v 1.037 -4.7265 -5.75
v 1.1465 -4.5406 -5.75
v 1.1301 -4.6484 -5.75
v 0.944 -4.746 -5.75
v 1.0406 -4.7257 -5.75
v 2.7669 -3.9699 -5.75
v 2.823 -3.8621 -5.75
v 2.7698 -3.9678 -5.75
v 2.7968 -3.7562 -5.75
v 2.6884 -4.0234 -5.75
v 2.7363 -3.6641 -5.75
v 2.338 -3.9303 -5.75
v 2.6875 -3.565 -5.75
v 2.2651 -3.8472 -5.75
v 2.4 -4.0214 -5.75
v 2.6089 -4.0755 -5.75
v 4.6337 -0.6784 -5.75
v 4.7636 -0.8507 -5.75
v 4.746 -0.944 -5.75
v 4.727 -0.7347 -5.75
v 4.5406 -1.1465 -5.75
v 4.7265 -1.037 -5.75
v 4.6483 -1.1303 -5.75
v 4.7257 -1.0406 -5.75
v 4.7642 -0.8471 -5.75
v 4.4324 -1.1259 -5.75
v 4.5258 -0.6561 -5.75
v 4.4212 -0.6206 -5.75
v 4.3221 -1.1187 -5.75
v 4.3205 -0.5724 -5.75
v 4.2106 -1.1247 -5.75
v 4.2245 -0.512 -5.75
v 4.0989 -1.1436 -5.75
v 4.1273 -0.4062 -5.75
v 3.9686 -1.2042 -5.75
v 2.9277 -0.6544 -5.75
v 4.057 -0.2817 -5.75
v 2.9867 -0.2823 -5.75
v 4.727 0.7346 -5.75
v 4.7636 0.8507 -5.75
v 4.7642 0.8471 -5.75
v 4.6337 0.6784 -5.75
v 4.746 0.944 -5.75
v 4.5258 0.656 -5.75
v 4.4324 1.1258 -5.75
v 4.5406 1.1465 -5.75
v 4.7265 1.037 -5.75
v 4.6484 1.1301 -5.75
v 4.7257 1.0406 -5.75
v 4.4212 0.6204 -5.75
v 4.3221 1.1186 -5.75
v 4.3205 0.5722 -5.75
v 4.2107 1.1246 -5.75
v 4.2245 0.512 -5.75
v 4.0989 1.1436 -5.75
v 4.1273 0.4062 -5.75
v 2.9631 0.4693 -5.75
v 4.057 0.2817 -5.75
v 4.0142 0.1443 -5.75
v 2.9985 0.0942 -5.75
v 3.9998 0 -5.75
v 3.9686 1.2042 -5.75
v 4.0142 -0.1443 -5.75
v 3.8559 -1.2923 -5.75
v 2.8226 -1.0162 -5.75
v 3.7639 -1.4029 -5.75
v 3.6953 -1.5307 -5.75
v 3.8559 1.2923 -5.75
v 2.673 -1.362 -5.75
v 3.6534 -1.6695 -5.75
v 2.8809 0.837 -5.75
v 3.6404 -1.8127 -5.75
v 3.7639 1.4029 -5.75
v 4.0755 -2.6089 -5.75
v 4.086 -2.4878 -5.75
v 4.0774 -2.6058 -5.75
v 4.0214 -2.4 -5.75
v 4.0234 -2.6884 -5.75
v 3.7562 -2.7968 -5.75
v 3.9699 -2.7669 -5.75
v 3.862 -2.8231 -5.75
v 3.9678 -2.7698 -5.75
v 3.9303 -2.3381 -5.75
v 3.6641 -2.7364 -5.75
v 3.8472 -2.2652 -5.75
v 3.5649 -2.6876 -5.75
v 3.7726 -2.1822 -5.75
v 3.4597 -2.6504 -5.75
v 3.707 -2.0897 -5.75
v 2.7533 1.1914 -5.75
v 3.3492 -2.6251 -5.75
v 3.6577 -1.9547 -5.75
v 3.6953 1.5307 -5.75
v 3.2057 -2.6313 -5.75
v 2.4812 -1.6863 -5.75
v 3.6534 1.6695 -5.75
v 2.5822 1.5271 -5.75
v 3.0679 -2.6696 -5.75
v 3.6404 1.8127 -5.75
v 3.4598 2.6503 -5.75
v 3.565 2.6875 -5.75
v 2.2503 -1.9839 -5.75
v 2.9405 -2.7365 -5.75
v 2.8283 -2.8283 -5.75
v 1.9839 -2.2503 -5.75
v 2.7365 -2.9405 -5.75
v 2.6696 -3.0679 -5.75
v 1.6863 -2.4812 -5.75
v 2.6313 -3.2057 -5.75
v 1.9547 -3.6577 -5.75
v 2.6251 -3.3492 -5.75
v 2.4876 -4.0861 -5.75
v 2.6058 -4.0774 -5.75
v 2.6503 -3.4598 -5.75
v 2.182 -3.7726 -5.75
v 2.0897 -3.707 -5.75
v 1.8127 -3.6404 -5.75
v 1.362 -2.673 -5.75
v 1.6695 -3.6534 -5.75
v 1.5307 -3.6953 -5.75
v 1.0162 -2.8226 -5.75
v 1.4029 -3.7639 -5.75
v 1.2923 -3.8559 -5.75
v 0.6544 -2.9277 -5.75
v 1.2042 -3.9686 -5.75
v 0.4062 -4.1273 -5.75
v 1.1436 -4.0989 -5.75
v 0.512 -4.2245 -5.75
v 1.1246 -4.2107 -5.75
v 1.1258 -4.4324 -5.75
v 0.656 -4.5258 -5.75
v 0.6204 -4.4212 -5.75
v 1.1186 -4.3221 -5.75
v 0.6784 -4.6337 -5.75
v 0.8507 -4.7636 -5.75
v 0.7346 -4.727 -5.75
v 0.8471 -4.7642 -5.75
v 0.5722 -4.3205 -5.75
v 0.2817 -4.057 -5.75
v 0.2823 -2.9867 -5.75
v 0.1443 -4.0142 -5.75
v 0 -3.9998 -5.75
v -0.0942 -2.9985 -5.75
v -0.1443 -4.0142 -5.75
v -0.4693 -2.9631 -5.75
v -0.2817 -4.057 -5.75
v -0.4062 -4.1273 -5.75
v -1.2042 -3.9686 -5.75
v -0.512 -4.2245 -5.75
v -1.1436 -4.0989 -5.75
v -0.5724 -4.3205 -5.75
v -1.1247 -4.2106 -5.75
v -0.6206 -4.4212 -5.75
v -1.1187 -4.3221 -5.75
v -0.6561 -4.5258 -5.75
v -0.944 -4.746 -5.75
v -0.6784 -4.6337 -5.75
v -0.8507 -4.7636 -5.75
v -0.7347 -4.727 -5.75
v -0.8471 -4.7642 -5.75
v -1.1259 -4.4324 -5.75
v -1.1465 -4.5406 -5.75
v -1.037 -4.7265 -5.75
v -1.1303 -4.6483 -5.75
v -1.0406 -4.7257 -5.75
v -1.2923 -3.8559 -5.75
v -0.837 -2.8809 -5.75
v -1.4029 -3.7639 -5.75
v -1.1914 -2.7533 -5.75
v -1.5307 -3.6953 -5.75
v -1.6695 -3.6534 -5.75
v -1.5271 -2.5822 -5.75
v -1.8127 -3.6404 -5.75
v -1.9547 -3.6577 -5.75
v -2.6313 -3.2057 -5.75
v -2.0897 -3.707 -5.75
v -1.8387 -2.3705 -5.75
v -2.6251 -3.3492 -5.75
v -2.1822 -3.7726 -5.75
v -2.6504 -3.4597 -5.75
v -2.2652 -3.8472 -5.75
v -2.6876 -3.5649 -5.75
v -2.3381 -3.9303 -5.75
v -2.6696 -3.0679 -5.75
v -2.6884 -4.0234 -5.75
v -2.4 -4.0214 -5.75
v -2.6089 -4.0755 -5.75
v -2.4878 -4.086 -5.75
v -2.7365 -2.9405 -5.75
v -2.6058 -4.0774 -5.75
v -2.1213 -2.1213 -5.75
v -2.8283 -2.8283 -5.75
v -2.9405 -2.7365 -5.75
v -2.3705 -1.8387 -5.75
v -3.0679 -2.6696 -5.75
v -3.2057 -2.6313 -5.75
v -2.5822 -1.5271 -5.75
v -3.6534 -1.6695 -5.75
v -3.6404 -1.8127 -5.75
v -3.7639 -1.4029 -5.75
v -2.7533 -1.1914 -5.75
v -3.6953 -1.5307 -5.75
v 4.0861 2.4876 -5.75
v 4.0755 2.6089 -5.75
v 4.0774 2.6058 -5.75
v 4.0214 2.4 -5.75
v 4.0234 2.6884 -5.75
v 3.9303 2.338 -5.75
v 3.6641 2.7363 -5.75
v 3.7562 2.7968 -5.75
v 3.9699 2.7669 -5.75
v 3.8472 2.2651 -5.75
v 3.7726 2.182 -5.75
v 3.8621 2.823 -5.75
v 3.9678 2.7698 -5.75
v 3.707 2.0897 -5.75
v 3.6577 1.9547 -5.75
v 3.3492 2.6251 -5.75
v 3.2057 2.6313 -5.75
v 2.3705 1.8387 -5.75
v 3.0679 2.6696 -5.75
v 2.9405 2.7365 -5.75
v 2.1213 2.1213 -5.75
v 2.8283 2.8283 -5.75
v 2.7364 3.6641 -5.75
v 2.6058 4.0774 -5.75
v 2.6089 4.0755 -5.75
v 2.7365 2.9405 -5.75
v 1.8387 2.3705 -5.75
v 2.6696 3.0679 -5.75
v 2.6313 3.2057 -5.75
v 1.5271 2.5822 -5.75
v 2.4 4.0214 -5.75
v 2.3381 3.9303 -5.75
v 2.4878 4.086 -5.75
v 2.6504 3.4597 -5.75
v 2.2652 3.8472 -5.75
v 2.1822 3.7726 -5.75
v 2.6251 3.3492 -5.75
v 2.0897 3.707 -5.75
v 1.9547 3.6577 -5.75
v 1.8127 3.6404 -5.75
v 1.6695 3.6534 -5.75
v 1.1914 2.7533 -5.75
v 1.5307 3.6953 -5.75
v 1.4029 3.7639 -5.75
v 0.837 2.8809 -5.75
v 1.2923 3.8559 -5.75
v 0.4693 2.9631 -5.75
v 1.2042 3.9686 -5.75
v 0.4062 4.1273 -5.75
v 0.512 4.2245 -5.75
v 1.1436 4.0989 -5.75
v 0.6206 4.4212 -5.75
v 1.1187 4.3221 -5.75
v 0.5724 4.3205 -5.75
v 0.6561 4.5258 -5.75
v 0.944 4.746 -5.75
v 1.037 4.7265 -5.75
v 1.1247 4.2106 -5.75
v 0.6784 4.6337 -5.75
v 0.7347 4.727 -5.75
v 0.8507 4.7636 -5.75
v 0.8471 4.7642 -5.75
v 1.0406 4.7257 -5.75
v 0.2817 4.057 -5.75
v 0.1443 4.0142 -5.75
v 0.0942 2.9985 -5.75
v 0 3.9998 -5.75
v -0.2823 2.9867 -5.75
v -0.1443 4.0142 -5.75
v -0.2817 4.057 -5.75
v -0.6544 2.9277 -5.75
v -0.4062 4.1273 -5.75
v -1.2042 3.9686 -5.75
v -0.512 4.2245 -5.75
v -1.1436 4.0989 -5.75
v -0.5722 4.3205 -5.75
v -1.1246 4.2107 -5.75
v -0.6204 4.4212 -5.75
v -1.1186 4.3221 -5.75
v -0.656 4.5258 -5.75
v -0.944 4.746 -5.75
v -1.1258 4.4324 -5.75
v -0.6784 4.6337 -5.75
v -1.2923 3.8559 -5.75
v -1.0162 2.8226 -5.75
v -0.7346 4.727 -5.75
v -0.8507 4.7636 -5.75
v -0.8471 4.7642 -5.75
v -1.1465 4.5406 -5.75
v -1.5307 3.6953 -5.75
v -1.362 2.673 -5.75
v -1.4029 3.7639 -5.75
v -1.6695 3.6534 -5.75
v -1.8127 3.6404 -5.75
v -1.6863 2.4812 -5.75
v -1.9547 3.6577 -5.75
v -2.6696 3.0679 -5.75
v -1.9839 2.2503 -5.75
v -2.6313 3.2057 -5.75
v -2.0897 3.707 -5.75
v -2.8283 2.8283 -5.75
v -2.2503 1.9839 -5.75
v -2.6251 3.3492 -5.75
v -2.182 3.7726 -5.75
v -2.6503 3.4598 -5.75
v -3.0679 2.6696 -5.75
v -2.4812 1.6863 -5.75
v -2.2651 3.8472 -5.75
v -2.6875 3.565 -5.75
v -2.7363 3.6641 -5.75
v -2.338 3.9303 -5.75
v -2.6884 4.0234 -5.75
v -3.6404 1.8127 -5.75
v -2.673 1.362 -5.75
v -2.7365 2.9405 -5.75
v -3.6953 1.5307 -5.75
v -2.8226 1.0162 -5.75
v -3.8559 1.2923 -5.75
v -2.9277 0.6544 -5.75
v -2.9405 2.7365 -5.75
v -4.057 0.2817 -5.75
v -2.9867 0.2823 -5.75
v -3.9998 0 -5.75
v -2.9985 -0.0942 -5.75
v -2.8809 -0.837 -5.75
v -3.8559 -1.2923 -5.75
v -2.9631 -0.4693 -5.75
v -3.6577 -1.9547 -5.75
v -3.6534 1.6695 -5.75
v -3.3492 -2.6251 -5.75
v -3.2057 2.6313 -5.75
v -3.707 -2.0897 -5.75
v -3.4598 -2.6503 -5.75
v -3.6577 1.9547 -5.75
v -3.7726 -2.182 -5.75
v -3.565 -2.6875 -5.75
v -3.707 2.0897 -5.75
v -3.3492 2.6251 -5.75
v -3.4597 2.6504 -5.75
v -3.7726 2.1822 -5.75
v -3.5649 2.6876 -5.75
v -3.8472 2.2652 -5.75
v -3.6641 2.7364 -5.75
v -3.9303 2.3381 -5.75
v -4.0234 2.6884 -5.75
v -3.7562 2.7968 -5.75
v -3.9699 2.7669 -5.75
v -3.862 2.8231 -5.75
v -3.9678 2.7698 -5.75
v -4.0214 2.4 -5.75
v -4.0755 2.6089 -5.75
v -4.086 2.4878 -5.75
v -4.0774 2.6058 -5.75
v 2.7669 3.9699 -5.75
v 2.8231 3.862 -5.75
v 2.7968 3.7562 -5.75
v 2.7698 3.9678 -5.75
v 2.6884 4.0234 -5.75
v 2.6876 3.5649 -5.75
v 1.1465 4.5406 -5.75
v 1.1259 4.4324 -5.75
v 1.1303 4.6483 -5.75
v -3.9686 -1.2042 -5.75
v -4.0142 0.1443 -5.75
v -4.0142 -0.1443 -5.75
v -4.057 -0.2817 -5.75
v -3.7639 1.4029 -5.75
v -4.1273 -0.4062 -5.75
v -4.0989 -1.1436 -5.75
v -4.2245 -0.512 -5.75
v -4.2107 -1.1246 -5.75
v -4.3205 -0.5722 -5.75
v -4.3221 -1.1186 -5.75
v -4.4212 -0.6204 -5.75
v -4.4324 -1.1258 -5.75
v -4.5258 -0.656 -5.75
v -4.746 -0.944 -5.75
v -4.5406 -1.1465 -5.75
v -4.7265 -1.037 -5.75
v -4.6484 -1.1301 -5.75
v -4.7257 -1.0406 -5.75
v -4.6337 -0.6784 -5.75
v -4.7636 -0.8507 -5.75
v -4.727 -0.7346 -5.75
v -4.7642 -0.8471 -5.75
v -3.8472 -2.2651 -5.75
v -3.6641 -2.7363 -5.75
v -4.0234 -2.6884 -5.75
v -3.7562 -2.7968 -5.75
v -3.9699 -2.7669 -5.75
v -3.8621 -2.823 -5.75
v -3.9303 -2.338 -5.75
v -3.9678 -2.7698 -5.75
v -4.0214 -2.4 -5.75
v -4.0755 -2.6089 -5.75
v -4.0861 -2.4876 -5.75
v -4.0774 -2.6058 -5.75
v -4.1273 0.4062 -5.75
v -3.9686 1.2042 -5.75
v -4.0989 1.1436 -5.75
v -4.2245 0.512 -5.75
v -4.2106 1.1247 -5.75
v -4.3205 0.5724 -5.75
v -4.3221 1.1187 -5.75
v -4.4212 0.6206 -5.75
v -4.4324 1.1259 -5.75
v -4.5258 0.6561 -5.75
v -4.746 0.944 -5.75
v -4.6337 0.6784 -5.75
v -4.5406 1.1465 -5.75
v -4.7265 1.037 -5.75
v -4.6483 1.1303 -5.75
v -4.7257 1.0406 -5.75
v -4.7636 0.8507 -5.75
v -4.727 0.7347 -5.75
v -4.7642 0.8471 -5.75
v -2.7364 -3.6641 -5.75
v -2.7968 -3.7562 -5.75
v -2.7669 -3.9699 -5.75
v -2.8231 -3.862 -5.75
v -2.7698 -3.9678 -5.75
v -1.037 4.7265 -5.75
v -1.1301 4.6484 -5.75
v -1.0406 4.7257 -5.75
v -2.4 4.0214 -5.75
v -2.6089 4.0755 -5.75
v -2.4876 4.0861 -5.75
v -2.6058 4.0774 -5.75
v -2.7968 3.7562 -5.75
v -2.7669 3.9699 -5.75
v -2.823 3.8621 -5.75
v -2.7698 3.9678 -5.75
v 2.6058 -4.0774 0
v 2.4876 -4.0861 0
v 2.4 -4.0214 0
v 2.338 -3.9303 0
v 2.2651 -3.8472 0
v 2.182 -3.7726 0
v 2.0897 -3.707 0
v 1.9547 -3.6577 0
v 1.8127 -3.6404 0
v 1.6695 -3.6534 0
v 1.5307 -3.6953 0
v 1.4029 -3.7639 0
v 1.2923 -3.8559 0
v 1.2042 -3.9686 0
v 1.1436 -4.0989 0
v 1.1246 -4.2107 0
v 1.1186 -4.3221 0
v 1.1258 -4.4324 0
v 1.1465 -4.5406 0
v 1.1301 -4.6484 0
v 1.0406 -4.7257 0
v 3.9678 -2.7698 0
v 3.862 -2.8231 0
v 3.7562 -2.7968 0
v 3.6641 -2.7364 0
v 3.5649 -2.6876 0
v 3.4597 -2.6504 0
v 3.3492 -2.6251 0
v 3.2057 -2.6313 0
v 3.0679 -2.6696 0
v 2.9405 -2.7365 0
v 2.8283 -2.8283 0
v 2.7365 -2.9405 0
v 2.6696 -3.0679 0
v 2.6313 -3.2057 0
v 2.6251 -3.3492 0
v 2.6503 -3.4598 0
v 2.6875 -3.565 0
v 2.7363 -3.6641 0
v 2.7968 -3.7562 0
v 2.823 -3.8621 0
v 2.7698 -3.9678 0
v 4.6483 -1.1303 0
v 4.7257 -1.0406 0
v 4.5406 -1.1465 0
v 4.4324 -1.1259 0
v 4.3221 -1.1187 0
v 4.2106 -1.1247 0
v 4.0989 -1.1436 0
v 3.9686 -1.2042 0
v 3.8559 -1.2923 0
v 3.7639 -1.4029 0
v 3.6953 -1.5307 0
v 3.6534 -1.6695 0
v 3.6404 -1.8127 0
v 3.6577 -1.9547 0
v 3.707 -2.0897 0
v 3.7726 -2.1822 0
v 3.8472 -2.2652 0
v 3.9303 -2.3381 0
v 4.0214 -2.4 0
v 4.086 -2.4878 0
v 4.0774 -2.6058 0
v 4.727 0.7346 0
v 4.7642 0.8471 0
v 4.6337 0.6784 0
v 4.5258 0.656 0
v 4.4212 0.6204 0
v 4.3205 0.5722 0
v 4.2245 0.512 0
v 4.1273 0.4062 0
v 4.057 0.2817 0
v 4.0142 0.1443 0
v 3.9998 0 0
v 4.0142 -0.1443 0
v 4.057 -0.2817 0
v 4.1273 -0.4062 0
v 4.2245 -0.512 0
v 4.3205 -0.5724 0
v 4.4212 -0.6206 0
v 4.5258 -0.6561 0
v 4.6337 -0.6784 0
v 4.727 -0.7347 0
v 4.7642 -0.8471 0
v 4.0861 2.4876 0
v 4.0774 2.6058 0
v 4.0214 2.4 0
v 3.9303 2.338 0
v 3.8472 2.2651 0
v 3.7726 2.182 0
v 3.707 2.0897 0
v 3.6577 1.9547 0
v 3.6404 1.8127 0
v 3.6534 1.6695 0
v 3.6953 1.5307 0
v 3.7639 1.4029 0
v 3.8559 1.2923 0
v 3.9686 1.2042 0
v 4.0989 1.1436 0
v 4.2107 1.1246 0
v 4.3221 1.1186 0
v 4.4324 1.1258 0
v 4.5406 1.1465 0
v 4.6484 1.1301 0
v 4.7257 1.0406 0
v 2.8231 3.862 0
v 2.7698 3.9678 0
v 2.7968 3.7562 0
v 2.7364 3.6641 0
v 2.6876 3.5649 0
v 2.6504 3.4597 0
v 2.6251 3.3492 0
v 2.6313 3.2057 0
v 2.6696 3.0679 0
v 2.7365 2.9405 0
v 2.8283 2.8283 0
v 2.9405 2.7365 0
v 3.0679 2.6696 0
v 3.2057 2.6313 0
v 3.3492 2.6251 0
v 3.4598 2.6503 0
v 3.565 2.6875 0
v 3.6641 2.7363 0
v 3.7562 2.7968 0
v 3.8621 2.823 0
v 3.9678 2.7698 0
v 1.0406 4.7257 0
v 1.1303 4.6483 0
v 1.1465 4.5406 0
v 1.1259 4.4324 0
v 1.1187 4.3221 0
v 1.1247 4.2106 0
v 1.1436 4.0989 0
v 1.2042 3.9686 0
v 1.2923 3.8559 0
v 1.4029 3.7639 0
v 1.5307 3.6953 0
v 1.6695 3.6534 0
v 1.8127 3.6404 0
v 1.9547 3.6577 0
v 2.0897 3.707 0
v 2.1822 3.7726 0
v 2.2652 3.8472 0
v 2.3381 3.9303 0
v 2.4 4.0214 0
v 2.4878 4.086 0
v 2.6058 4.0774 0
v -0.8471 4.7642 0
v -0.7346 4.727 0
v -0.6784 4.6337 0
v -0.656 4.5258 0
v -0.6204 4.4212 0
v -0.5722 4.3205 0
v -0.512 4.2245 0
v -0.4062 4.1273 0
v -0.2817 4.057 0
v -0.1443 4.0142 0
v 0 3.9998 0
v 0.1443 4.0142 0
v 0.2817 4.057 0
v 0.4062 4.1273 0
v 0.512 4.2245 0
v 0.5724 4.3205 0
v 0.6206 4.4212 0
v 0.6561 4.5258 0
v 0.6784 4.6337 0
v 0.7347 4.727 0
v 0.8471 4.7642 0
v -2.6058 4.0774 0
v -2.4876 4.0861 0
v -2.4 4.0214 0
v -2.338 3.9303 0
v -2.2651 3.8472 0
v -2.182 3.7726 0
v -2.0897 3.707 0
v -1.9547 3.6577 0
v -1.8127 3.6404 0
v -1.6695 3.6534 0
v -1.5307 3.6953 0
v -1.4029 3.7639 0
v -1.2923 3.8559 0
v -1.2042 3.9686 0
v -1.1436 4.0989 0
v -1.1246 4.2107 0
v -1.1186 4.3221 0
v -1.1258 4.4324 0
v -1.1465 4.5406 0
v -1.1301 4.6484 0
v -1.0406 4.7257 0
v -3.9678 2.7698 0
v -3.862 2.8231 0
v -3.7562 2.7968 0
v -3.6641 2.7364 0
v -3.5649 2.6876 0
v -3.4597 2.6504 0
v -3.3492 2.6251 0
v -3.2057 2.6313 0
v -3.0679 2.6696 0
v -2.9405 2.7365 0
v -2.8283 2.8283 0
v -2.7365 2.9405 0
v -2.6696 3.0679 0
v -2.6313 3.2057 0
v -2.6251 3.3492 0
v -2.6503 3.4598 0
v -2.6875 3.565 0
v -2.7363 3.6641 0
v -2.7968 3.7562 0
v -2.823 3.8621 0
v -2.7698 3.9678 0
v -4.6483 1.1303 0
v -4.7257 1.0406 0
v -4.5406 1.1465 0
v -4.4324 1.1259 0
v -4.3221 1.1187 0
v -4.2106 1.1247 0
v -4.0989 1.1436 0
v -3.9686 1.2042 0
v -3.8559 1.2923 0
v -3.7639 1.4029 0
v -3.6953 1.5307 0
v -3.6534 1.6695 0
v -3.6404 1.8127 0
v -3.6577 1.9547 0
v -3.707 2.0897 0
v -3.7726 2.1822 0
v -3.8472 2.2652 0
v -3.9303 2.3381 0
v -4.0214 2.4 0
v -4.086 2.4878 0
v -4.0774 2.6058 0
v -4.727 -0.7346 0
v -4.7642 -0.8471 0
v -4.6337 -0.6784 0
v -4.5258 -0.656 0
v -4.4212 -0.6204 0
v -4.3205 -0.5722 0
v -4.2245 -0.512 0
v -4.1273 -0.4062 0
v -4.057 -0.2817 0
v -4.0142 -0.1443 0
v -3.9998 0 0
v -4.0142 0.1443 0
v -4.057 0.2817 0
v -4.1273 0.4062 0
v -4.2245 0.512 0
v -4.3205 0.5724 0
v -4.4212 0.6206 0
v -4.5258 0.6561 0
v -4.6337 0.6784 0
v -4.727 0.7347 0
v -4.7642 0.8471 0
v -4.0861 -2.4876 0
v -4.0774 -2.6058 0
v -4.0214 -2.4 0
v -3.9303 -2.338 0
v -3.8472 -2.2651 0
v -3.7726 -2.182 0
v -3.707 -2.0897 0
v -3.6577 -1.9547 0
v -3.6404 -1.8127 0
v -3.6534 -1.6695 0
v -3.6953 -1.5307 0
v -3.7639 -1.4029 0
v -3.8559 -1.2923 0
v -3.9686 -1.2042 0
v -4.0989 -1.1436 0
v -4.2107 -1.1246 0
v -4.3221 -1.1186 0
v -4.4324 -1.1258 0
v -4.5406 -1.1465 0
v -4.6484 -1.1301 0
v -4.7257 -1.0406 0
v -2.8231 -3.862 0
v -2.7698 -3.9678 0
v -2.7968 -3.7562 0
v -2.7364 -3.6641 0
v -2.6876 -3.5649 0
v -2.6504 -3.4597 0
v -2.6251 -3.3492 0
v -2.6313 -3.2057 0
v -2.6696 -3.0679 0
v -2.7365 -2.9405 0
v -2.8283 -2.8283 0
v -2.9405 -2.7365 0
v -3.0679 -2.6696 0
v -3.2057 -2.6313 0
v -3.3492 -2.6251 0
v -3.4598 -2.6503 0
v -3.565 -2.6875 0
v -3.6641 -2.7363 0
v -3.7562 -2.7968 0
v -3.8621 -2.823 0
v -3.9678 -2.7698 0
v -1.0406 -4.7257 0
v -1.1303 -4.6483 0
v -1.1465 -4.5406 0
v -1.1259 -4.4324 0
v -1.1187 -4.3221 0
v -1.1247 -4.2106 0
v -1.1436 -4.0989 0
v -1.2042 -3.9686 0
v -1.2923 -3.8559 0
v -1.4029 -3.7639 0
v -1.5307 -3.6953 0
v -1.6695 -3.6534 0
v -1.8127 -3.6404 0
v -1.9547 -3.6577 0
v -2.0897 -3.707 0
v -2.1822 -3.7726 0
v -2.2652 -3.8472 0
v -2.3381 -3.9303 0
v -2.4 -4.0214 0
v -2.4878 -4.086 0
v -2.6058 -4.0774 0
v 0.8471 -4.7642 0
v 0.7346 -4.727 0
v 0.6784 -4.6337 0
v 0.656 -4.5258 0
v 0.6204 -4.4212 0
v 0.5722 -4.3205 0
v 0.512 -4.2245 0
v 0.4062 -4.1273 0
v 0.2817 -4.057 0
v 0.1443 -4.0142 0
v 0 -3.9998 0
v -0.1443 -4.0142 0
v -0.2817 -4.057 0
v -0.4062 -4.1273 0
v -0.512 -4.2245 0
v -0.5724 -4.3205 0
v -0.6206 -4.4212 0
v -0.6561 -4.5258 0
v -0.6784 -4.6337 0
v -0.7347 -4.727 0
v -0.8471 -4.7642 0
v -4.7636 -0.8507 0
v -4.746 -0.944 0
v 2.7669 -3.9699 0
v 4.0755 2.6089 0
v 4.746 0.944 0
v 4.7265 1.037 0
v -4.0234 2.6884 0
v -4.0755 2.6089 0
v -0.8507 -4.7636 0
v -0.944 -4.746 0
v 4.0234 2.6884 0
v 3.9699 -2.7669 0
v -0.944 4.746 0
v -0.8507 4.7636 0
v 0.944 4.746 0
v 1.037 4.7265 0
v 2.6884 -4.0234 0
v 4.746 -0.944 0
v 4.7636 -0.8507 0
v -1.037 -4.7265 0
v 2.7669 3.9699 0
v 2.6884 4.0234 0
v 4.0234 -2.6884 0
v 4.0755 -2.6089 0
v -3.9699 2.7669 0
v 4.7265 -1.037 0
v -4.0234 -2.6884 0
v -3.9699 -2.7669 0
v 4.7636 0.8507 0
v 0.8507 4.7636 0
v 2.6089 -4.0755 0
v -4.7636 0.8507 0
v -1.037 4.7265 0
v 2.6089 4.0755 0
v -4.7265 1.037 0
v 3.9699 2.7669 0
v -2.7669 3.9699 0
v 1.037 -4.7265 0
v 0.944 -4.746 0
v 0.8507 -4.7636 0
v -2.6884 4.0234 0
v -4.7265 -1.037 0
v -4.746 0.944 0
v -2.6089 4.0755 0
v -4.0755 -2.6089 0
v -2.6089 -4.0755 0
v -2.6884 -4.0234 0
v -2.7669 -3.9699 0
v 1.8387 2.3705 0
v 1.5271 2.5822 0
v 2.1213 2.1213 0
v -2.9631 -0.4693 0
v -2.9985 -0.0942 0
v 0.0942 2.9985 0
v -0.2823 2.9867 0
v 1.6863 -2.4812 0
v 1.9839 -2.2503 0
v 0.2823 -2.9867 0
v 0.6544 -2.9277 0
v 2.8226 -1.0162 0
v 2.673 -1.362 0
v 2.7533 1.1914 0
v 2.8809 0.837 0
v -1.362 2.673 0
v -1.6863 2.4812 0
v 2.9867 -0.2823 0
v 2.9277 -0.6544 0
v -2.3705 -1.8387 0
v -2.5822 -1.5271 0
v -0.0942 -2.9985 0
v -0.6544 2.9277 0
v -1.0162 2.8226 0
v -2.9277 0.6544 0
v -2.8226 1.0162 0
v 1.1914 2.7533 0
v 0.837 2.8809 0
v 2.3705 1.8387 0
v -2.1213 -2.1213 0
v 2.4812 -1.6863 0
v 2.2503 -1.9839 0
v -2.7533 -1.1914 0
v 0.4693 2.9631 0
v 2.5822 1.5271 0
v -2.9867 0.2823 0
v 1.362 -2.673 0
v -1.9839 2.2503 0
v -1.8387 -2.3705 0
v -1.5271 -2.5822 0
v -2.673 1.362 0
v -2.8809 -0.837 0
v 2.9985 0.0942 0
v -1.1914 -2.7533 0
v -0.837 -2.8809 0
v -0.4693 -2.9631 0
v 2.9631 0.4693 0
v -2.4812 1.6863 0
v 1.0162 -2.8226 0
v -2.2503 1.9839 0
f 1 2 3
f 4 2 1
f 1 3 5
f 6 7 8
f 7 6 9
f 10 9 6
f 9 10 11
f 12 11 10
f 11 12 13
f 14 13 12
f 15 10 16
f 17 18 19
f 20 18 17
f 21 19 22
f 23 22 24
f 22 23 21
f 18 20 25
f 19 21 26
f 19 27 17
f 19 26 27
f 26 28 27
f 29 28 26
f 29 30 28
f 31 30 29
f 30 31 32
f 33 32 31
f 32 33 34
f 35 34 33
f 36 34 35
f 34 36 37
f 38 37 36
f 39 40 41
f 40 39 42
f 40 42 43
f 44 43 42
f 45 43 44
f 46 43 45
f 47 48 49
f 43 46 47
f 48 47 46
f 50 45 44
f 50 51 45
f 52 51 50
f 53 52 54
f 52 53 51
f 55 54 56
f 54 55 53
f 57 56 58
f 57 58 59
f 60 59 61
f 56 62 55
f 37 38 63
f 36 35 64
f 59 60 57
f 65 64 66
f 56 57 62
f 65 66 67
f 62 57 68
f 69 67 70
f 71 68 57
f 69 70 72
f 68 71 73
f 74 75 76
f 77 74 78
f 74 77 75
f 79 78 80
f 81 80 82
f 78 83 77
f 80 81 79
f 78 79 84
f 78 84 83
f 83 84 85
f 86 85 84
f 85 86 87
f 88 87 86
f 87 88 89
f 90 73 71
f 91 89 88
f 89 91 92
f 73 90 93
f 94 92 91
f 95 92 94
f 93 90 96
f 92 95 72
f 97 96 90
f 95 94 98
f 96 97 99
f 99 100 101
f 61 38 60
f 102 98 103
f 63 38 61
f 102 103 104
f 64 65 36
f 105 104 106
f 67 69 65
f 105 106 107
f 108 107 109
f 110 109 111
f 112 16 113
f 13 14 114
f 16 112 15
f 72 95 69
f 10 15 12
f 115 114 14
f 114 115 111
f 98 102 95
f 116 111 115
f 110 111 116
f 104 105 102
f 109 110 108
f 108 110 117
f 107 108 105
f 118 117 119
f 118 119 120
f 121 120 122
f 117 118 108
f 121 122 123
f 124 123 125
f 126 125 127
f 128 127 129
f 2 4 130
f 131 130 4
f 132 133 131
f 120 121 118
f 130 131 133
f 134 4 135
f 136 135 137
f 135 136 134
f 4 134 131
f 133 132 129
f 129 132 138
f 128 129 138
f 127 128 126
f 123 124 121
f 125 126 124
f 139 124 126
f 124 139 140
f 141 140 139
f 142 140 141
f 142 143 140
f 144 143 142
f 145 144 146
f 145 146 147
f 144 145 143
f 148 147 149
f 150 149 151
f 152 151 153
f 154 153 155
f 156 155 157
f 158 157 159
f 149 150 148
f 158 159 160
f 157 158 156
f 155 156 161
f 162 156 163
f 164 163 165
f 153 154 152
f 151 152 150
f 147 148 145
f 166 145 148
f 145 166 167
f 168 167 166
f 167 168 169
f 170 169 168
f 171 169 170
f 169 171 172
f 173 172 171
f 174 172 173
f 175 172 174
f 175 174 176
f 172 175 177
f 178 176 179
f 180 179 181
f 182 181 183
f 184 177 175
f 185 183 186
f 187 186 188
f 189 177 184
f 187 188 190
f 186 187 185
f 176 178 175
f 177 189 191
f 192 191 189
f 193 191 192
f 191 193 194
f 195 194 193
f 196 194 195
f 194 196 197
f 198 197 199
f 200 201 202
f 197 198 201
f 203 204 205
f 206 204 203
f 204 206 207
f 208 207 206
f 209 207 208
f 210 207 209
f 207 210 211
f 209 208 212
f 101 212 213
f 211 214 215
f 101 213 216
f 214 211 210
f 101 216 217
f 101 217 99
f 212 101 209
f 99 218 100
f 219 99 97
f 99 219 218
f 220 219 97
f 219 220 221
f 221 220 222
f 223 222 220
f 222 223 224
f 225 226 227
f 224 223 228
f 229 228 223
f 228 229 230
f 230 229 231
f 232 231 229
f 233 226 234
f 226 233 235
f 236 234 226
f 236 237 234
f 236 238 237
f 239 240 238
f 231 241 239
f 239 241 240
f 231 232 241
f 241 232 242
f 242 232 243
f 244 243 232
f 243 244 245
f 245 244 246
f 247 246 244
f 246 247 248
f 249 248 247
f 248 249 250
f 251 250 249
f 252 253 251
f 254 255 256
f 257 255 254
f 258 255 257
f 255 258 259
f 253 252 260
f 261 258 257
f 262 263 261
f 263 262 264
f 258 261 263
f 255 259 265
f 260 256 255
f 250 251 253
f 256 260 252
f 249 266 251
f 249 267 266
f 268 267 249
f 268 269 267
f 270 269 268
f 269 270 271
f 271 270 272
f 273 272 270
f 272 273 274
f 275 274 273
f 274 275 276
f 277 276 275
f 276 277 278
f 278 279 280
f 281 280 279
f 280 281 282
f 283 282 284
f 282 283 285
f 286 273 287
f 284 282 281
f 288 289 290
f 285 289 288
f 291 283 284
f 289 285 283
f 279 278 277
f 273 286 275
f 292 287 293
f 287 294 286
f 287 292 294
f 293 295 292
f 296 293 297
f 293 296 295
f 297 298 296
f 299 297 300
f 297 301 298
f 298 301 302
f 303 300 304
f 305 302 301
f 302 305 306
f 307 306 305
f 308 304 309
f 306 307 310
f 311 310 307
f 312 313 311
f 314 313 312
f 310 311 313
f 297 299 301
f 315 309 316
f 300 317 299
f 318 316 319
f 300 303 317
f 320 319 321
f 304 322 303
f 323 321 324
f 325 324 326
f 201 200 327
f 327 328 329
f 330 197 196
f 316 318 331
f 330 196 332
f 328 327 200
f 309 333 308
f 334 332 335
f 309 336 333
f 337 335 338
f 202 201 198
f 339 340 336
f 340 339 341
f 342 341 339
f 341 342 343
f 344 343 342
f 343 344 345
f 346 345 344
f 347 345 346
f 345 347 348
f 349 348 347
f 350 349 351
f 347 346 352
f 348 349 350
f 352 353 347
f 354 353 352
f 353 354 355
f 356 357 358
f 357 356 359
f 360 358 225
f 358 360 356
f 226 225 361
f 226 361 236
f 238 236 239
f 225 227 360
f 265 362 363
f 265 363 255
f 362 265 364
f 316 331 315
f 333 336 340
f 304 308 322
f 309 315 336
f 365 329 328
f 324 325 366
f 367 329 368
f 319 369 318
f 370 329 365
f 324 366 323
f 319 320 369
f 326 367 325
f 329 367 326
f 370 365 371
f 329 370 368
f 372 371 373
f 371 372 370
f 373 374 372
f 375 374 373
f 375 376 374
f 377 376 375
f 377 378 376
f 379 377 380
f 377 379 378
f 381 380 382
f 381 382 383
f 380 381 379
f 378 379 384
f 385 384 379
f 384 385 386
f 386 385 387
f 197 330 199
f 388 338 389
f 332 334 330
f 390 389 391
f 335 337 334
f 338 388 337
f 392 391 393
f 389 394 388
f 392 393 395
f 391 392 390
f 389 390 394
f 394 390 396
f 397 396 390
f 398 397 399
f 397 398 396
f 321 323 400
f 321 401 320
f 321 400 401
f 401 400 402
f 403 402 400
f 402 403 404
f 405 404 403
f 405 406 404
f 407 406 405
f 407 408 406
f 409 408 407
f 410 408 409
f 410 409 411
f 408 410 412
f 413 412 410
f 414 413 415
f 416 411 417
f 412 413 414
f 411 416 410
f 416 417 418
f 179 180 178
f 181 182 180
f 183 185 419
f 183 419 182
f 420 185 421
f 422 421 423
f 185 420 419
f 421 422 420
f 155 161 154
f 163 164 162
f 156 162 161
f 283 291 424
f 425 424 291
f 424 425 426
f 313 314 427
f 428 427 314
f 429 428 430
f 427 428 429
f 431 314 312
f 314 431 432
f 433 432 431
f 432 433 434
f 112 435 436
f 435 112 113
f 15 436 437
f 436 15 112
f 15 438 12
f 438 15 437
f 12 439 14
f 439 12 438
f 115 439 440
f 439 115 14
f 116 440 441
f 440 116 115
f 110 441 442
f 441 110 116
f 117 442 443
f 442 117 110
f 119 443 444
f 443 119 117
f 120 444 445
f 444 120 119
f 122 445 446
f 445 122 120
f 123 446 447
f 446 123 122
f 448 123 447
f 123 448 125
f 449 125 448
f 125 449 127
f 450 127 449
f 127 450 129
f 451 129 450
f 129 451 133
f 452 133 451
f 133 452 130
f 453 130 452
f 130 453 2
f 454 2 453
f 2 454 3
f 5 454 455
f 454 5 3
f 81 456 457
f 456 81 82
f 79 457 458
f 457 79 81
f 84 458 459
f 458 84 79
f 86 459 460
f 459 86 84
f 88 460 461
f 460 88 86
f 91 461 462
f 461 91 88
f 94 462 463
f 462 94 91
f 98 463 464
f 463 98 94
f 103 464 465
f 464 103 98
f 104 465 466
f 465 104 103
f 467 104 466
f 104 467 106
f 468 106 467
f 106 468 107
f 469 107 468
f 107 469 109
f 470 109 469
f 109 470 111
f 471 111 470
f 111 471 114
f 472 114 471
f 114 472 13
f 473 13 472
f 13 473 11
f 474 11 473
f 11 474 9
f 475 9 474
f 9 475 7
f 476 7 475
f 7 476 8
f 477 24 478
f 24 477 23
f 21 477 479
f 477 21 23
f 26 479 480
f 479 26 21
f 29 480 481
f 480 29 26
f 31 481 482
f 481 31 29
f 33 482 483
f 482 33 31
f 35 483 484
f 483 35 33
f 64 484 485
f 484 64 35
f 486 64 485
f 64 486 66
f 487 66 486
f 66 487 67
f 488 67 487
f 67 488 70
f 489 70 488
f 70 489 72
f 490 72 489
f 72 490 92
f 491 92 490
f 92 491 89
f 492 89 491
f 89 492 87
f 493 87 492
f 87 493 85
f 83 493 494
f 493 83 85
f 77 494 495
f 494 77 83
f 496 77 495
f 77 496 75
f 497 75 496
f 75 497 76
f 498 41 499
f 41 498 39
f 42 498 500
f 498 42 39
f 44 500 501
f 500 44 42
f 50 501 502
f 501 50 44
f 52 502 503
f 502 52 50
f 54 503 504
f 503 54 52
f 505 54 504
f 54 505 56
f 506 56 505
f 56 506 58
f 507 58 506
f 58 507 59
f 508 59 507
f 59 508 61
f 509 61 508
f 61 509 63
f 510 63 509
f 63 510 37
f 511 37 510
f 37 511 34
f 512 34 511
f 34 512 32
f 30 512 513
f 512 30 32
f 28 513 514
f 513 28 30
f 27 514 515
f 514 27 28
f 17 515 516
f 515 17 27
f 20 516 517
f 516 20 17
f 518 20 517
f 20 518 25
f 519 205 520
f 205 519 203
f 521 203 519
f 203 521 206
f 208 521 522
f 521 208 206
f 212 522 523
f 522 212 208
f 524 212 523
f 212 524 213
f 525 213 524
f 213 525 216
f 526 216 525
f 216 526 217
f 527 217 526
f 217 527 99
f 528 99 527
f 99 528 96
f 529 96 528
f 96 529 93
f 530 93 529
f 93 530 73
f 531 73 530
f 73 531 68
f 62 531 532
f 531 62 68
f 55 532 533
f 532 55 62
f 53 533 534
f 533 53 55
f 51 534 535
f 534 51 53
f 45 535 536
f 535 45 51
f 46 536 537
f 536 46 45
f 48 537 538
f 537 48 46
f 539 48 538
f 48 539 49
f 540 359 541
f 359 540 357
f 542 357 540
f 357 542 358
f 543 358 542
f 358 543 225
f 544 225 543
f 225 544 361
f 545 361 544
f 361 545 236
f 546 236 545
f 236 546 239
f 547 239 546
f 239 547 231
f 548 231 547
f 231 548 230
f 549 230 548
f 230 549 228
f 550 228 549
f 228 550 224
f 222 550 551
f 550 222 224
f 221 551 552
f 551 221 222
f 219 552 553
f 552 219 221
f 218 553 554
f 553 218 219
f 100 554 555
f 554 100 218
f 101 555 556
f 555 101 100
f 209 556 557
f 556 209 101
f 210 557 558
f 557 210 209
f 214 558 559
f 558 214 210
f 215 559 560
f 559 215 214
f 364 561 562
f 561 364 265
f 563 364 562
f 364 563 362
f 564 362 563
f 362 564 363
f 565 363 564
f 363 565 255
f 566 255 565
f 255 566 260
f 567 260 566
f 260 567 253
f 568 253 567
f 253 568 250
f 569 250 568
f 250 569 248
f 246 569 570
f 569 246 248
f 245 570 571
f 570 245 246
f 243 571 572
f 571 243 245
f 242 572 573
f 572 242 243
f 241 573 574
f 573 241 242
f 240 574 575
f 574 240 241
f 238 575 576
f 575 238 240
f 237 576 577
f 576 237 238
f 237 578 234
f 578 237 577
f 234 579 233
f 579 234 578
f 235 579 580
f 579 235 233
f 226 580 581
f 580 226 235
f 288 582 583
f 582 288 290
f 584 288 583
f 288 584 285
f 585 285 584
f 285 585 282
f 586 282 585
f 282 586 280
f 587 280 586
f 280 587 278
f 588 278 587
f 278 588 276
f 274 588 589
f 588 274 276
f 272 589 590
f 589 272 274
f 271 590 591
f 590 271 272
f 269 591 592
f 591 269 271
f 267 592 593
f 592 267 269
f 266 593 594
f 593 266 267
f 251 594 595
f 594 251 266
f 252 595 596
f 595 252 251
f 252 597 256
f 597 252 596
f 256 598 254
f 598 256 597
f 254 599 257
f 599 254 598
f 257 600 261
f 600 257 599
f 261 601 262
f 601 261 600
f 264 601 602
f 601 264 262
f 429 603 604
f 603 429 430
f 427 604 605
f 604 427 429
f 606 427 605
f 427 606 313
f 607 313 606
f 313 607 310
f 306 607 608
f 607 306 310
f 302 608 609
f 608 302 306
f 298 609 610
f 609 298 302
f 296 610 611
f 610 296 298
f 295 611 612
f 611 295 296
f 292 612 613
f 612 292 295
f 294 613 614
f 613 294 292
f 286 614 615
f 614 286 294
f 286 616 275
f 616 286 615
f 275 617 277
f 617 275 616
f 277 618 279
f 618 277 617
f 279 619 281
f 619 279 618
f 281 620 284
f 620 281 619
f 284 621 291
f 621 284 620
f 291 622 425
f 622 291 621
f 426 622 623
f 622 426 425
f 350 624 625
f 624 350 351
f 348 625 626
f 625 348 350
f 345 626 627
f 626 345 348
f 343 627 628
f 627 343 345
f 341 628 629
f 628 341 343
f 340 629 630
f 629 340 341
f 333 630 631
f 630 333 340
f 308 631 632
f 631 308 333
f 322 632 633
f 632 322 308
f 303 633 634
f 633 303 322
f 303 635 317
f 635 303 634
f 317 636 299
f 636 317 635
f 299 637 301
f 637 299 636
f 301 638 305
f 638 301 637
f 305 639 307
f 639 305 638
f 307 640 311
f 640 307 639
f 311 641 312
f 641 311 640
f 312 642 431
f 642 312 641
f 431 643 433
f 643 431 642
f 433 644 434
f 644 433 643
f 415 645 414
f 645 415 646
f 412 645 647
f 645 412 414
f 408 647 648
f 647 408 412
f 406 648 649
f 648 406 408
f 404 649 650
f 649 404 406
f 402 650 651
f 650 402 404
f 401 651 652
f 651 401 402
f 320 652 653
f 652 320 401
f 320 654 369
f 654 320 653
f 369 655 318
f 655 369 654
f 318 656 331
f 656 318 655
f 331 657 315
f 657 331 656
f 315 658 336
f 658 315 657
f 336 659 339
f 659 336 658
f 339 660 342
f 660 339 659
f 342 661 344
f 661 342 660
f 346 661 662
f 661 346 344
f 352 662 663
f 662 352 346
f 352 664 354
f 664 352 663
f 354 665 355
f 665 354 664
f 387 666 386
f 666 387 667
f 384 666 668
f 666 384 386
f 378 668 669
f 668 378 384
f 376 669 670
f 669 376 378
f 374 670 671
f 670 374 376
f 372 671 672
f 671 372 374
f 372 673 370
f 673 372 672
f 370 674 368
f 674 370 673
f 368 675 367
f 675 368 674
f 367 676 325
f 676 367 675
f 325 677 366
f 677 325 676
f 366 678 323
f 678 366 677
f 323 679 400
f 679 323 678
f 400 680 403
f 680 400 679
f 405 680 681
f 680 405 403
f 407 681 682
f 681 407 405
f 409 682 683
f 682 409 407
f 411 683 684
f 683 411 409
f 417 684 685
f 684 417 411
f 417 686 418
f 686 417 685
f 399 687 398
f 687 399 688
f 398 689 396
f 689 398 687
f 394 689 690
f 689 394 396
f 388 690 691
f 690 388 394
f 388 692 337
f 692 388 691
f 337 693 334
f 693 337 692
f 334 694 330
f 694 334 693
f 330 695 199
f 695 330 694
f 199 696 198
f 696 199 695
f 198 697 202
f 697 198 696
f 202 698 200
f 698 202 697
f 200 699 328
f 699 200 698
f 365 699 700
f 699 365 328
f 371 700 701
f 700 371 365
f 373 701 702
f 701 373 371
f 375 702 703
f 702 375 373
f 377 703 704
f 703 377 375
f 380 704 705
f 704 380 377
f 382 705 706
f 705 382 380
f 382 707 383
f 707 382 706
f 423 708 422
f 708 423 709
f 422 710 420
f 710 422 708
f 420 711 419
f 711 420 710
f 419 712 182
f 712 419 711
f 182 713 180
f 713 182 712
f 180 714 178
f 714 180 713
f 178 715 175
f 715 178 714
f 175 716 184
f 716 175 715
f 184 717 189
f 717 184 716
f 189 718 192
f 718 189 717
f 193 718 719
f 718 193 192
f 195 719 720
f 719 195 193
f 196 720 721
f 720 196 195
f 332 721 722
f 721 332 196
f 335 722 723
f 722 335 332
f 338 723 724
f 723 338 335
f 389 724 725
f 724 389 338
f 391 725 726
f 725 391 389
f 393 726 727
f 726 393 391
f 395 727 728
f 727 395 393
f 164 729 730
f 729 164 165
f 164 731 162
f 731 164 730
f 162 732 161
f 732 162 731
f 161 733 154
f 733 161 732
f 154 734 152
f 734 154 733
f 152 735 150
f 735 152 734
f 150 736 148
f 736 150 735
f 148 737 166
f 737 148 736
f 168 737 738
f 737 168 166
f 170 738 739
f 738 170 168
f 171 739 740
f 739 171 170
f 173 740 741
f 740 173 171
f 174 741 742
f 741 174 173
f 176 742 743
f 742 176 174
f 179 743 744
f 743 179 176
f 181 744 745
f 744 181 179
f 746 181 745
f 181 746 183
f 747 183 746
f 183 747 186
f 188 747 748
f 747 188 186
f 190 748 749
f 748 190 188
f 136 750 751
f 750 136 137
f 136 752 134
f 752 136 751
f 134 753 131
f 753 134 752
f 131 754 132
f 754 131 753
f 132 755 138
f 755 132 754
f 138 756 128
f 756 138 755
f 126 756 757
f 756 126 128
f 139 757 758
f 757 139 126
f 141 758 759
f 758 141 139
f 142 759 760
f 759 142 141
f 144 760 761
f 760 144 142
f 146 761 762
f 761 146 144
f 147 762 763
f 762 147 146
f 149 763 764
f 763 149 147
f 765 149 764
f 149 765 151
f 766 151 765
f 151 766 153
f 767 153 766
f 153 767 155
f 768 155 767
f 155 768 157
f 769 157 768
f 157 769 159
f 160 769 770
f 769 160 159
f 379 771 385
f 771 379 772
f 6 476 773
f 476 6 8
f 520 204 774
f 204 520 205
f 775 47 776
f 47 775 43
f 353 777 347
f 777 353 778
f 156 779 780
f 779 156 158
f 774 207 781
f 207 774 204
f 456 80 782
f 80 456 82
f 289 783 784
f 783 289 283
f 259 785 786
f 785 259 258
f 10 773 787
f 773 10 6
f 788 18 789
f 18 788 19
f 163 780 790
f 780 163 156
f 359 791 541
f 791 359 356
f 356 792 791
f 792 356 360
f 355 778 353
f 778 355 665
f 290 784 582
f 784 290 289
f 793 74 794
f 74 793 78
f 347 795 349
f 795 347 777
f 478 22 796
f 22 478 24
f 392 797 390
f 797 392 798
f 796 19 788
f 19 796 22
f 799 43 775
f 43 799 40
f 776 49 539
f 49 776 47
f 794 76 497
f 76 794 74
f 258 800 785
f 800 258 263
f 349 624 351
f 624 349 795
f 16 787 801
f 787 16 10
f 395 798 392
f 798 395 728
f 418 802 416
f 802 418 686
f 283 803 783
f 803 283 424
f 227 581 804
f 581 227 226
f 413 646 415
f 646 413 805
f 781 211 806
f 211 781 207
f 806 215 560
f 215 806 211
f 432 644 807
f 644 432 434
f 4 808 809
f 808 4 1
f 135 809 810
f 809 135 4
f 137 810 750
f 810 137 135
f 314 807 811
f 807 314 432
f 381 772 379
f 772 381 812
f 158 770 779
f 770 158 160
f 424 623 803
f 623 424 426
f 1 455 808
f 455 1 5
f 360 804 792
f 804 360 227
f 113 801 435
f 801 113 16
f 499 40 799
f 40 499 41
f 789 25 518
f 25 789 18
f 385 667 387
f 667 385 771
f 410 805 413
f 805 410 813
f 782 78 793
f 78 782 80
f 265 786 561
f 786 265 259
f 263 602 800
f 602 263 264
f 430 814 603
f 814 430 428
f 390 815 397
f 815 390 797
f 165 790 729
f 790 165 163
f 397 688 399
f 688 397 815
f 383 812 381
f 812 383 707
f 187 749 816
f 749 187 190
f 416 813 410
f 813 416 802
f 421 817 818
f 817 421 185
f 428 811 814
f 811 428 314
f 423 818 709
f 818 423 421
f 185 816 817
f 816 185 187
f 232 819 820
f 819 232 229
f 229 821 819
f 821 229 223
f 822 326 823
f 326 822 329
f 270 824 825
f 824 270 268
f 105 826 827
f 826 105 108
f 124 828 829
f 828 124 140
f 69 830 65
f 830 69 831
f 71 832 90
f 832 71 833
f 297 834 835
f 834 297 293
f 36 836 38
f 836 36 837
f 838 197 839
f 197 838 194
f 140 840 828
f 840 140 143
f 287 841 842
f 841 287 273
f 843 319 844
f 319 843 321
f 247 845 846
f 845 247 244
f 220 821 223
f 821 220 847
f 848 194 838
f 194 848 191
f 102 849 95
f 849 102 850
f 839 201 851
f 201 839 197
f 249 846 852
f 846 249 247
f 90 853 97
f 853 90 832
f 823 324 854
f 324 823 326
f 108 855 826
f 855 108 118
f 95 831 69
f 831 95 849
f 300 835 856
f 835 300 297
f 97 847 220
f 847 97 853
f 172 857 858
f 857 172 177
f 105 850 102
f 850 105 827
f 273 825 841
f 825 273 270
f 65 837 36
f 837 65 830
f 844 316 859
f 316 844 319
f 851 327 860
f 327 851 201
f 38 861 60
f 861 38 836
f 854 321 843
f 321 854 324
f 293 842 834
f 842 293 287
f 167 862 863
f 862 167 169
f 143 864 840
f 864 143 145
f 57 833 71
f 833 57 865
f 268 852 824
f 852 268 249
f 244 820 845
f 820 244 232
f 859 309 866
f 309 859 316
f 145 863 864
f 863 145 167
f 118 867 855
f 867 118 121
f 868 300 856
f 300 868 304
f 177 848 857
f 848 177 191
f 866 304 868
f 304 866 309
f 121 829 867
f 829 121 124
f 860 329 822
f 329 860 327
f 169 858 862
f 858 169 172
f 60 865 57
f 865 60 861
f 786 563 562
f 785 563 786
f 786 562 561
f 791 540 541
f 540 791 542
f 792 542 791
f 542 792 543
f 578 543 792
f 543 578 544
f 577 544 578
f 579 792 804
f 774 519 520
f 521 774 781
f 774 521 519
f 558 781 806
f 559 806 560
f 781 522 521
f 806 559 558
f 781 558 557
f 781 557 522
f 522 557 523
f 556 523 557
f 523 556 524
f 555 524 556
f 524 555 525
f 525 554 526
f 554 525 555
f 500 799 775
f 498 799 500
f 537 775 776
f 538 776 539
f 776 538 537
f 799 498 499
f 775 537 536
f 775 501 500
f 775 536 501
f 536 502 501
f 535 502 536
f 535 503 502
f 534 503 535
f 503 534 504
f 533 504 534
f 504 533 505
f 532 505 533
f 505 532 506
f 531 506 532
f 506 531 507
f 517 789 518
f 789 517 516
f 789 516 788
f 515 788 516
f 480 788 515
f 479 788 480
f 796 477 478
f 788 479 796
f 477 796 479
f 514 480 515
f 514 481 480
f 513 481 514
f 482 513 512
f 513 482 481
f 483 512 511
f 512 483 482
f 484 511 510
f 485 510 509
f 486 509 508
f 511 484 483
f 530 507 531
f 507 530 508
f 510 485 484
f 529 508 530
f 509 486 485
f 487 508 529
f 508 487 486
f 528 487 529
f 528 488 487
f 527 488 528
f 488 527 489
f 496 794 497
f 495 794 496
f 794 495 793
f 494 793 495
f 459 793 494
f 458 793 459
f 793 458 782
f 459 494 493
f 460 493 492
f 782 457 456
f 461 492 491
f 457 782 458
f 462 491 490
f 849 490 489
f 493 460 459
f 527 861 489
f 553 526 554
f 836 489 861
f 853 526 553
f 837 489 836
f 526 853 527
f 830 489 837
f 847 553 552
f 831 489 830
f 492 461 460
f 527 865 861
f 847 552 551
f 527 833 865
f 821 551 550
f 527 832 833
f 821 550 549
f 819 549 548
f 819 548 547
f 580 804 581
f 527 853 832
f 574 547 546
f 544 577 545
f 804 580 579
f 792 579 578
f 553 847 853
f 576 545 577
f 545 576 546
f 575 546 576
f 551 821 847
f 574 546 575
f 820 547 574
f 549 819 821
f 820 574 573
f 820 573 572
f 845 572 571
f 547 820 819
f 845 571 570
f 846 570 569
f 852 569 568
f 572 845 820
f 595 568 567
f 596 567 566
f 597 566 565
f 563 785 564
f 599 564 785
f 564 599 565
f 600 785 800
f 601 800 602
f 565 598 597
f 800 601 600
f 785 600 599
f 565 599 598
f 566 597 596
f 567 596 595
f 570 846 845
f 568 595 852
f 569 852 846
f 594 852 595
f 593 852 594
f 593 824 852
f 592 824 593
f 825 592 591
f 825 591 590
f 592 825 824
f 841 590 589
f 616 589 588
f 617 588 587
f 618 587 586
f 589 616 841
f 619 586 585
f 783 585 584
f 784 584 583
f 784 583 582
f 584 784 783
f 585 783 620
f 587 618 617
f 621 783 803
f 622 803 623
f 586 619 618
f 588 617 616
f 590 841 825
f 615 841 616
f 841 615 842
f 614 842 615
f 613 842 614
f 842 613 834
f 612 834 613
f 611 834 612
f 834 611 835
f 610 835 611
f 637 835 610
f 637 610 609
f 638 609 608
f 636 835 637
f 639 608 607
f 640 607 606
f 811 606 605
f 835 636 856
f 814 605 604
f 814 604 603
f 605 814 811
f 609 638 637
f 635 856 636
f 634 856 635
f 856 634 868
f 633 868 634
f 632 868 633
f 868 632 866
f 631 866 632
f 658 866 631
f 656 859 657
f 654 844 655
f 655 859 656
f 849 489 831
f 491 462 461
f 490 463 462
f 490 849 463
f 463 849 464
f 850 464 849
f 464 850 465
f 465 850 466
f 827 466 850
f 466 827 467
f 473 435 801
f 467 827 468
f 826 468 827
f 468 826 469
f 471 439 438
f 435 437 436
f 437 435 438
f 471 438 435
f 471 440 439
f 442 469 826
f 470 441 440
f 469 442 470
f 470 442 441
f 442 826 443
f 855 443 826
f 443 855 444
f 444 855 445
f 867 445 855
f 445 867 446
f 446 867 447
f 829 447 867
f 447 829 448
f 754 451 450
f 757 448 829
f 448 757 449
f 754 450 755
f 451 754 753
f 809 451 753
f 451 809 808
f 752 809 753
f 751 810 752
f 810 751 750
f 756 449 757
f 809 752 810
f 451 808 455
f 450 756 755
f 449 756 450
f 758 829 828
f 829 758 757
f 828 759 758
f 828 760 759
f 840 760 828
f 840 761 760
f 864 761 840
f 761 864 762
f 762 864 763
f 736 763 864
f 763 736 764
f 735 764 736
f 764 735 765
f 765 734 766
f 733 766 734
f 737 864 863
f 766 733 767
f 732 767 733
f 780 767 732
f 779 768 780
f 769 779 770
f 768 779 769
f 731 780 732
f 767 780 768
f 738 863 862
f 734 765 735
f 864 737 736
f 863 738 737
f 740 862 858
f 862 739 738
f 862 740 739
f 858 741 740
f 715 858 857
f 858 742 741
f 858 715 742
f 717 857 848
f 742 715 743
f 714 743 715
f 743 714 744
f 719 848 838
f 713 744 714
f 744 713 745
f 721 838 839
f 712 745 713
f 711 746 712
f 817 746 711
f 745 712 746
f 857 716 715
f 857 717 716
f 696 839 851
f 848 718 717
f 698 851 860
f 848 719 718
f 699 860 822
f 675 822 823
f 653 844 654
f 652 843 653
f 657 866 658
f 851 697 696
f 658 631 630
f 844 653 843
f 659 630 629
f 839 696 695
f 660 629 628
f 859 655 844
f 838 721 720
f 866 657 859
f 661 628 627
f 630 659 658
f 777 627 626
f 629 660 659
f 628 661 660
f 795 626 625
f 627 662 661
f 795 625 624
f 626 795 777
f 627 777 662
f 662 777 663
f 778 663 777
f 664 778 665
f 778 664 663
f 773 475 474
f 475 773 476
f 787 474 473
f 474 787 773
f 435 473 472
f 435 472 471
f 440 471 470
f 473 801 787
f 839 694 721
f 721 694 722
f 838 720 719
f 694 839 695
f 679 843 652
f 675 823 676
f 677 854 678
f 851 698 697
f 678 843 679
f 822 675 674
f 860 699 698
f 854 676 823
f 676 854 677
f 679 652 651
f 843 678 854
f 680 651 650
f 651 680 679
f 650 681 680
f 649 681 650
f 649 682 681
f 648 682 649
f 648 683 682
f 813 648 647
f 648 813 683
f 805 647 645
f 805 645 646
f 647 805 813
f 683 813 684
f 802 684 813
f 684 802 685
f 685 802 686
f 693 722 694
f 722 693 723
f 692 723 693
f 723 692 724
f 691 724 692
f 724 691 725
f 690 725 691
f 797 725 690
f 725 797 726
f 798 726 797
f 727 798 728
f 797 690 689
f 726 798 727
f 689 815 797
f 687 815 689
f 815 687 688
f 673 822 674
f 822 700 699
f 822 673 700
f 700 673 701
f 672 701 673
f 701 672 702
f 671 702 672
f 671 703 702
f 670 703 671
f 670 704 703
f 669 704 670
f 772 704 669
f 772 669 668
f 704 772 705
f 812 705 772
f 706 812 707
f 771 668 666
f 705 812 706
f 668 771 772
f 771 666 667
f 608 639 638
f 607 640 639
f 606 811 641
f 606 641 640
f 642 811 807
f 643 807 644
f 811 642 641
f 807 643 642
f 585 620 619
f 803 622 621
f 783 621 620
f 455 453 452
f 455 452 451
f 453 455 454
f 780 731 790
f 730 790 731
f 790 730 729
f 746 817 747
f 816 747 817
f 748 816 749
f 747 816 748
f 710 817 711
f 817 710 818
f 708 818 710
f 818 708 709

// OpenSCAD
$fn = 50;
use <C:/gh/oomlout_opsc_version_3/pulley_gt2.scad>


difference() {
	union() {
		*color(alpha = 1.0000000000, c = "gray") {
			translate(v = [0, 7, 0]) {
				linear_extrude(height = 1) {
					text(font = "Arial:style=Bold", halign = "center", size = 4.5000000000, text = "COMMENT gear main", valign = "center");
				}
			}
		}
		translate(v = [0, 0, -5.7500000000]) {
			pulley_gt2(depth = 11.5000000000, number_of_teeth = 16);
		}
	}
	union() {
		translate(v = [0, 0, 2]) {
			rotate(a = [0, 0, 45]) {
				difference() {
					union() {
						translate(v = [0, -7.3750000000, 2.5000000000]) {
							rotate(a = [0, 0, 0]) {
								difference() {
									union() {
										#translate(v = [0, 0, -1.2500000000]) {
											cylinder(h = 1.2500000000, r = 2.5000000000);
										}
										#translate(v = [0, 0, -16.2500000000]) {
											cylinder(h = 15, r = 1.0000000000);
										}
										#translate(v = [0, 0, -17.5000000000]) {
											cylinder(h = 15, r = 1.3750000000);
										}
										#translate(v = [0, 0, -16.3000000000]) {
											cylinder(h = 15, r = 1.0000000000);
										}
									}
									union();
								}
							}
						}
						translate(v = [0, 7.3750000000, 2.5000000000]) {
							rotate(a = [0, 0, 0]) {
								difference() {
									union() {
										#translate(v = [0, 0, -1.2500000000]) {
											cylinder(h = 1.2500000000, r = 2.5000000000);
										}
										#translate(v = [0, 0, -16.2500000000]) {
											cylinder(h = 15, r = 1.0000000000);
										}
										#translate(v = [0, 0, -17.5000000000]) {
											cylinder(h = 15, r = 1.3750000000);
										}
										#translate(v = [0, 0, -16.3000000000]) {
											cylinder(h = 15, r = 1.0000000000);
										}
									}
									union();
								}
							}
						}
						#translate(v = [0, 0, -100.0000000000]) {
							cylinder(h = 200, r = 1.2500000000);
						}
						#translate(v = [0, 0, -100.0000000000]) {
							cylinder(h = 200, r = 3.0000000000);
						}
					}
					union();
				}
			}
		}
		*color(alpha = 1.0000000000, c = "gray") {
			translate(v = [0, 7, 0]) {
				linear_extrude(height = 1) {
					text(font = "Arial:style=Bold", halign = "center", size = 4.5000000000, text = "COMMENT holes main", valign = "center");
				}
			}
		}
		translate(v = [-250.0000000000, -250.0000000000, 0]) {
			cube(size = [500, 500, 500]);
		}
		translate(v = [-250.0000000000, -250.0000000000, 0]) {
			cube(size = [500, 500, 500]);
		}
		translate(v = [-250.0000000000, -250.0000000000, 0]) {
			cube(size = [500, 500, 500]);
		}
	}
}
